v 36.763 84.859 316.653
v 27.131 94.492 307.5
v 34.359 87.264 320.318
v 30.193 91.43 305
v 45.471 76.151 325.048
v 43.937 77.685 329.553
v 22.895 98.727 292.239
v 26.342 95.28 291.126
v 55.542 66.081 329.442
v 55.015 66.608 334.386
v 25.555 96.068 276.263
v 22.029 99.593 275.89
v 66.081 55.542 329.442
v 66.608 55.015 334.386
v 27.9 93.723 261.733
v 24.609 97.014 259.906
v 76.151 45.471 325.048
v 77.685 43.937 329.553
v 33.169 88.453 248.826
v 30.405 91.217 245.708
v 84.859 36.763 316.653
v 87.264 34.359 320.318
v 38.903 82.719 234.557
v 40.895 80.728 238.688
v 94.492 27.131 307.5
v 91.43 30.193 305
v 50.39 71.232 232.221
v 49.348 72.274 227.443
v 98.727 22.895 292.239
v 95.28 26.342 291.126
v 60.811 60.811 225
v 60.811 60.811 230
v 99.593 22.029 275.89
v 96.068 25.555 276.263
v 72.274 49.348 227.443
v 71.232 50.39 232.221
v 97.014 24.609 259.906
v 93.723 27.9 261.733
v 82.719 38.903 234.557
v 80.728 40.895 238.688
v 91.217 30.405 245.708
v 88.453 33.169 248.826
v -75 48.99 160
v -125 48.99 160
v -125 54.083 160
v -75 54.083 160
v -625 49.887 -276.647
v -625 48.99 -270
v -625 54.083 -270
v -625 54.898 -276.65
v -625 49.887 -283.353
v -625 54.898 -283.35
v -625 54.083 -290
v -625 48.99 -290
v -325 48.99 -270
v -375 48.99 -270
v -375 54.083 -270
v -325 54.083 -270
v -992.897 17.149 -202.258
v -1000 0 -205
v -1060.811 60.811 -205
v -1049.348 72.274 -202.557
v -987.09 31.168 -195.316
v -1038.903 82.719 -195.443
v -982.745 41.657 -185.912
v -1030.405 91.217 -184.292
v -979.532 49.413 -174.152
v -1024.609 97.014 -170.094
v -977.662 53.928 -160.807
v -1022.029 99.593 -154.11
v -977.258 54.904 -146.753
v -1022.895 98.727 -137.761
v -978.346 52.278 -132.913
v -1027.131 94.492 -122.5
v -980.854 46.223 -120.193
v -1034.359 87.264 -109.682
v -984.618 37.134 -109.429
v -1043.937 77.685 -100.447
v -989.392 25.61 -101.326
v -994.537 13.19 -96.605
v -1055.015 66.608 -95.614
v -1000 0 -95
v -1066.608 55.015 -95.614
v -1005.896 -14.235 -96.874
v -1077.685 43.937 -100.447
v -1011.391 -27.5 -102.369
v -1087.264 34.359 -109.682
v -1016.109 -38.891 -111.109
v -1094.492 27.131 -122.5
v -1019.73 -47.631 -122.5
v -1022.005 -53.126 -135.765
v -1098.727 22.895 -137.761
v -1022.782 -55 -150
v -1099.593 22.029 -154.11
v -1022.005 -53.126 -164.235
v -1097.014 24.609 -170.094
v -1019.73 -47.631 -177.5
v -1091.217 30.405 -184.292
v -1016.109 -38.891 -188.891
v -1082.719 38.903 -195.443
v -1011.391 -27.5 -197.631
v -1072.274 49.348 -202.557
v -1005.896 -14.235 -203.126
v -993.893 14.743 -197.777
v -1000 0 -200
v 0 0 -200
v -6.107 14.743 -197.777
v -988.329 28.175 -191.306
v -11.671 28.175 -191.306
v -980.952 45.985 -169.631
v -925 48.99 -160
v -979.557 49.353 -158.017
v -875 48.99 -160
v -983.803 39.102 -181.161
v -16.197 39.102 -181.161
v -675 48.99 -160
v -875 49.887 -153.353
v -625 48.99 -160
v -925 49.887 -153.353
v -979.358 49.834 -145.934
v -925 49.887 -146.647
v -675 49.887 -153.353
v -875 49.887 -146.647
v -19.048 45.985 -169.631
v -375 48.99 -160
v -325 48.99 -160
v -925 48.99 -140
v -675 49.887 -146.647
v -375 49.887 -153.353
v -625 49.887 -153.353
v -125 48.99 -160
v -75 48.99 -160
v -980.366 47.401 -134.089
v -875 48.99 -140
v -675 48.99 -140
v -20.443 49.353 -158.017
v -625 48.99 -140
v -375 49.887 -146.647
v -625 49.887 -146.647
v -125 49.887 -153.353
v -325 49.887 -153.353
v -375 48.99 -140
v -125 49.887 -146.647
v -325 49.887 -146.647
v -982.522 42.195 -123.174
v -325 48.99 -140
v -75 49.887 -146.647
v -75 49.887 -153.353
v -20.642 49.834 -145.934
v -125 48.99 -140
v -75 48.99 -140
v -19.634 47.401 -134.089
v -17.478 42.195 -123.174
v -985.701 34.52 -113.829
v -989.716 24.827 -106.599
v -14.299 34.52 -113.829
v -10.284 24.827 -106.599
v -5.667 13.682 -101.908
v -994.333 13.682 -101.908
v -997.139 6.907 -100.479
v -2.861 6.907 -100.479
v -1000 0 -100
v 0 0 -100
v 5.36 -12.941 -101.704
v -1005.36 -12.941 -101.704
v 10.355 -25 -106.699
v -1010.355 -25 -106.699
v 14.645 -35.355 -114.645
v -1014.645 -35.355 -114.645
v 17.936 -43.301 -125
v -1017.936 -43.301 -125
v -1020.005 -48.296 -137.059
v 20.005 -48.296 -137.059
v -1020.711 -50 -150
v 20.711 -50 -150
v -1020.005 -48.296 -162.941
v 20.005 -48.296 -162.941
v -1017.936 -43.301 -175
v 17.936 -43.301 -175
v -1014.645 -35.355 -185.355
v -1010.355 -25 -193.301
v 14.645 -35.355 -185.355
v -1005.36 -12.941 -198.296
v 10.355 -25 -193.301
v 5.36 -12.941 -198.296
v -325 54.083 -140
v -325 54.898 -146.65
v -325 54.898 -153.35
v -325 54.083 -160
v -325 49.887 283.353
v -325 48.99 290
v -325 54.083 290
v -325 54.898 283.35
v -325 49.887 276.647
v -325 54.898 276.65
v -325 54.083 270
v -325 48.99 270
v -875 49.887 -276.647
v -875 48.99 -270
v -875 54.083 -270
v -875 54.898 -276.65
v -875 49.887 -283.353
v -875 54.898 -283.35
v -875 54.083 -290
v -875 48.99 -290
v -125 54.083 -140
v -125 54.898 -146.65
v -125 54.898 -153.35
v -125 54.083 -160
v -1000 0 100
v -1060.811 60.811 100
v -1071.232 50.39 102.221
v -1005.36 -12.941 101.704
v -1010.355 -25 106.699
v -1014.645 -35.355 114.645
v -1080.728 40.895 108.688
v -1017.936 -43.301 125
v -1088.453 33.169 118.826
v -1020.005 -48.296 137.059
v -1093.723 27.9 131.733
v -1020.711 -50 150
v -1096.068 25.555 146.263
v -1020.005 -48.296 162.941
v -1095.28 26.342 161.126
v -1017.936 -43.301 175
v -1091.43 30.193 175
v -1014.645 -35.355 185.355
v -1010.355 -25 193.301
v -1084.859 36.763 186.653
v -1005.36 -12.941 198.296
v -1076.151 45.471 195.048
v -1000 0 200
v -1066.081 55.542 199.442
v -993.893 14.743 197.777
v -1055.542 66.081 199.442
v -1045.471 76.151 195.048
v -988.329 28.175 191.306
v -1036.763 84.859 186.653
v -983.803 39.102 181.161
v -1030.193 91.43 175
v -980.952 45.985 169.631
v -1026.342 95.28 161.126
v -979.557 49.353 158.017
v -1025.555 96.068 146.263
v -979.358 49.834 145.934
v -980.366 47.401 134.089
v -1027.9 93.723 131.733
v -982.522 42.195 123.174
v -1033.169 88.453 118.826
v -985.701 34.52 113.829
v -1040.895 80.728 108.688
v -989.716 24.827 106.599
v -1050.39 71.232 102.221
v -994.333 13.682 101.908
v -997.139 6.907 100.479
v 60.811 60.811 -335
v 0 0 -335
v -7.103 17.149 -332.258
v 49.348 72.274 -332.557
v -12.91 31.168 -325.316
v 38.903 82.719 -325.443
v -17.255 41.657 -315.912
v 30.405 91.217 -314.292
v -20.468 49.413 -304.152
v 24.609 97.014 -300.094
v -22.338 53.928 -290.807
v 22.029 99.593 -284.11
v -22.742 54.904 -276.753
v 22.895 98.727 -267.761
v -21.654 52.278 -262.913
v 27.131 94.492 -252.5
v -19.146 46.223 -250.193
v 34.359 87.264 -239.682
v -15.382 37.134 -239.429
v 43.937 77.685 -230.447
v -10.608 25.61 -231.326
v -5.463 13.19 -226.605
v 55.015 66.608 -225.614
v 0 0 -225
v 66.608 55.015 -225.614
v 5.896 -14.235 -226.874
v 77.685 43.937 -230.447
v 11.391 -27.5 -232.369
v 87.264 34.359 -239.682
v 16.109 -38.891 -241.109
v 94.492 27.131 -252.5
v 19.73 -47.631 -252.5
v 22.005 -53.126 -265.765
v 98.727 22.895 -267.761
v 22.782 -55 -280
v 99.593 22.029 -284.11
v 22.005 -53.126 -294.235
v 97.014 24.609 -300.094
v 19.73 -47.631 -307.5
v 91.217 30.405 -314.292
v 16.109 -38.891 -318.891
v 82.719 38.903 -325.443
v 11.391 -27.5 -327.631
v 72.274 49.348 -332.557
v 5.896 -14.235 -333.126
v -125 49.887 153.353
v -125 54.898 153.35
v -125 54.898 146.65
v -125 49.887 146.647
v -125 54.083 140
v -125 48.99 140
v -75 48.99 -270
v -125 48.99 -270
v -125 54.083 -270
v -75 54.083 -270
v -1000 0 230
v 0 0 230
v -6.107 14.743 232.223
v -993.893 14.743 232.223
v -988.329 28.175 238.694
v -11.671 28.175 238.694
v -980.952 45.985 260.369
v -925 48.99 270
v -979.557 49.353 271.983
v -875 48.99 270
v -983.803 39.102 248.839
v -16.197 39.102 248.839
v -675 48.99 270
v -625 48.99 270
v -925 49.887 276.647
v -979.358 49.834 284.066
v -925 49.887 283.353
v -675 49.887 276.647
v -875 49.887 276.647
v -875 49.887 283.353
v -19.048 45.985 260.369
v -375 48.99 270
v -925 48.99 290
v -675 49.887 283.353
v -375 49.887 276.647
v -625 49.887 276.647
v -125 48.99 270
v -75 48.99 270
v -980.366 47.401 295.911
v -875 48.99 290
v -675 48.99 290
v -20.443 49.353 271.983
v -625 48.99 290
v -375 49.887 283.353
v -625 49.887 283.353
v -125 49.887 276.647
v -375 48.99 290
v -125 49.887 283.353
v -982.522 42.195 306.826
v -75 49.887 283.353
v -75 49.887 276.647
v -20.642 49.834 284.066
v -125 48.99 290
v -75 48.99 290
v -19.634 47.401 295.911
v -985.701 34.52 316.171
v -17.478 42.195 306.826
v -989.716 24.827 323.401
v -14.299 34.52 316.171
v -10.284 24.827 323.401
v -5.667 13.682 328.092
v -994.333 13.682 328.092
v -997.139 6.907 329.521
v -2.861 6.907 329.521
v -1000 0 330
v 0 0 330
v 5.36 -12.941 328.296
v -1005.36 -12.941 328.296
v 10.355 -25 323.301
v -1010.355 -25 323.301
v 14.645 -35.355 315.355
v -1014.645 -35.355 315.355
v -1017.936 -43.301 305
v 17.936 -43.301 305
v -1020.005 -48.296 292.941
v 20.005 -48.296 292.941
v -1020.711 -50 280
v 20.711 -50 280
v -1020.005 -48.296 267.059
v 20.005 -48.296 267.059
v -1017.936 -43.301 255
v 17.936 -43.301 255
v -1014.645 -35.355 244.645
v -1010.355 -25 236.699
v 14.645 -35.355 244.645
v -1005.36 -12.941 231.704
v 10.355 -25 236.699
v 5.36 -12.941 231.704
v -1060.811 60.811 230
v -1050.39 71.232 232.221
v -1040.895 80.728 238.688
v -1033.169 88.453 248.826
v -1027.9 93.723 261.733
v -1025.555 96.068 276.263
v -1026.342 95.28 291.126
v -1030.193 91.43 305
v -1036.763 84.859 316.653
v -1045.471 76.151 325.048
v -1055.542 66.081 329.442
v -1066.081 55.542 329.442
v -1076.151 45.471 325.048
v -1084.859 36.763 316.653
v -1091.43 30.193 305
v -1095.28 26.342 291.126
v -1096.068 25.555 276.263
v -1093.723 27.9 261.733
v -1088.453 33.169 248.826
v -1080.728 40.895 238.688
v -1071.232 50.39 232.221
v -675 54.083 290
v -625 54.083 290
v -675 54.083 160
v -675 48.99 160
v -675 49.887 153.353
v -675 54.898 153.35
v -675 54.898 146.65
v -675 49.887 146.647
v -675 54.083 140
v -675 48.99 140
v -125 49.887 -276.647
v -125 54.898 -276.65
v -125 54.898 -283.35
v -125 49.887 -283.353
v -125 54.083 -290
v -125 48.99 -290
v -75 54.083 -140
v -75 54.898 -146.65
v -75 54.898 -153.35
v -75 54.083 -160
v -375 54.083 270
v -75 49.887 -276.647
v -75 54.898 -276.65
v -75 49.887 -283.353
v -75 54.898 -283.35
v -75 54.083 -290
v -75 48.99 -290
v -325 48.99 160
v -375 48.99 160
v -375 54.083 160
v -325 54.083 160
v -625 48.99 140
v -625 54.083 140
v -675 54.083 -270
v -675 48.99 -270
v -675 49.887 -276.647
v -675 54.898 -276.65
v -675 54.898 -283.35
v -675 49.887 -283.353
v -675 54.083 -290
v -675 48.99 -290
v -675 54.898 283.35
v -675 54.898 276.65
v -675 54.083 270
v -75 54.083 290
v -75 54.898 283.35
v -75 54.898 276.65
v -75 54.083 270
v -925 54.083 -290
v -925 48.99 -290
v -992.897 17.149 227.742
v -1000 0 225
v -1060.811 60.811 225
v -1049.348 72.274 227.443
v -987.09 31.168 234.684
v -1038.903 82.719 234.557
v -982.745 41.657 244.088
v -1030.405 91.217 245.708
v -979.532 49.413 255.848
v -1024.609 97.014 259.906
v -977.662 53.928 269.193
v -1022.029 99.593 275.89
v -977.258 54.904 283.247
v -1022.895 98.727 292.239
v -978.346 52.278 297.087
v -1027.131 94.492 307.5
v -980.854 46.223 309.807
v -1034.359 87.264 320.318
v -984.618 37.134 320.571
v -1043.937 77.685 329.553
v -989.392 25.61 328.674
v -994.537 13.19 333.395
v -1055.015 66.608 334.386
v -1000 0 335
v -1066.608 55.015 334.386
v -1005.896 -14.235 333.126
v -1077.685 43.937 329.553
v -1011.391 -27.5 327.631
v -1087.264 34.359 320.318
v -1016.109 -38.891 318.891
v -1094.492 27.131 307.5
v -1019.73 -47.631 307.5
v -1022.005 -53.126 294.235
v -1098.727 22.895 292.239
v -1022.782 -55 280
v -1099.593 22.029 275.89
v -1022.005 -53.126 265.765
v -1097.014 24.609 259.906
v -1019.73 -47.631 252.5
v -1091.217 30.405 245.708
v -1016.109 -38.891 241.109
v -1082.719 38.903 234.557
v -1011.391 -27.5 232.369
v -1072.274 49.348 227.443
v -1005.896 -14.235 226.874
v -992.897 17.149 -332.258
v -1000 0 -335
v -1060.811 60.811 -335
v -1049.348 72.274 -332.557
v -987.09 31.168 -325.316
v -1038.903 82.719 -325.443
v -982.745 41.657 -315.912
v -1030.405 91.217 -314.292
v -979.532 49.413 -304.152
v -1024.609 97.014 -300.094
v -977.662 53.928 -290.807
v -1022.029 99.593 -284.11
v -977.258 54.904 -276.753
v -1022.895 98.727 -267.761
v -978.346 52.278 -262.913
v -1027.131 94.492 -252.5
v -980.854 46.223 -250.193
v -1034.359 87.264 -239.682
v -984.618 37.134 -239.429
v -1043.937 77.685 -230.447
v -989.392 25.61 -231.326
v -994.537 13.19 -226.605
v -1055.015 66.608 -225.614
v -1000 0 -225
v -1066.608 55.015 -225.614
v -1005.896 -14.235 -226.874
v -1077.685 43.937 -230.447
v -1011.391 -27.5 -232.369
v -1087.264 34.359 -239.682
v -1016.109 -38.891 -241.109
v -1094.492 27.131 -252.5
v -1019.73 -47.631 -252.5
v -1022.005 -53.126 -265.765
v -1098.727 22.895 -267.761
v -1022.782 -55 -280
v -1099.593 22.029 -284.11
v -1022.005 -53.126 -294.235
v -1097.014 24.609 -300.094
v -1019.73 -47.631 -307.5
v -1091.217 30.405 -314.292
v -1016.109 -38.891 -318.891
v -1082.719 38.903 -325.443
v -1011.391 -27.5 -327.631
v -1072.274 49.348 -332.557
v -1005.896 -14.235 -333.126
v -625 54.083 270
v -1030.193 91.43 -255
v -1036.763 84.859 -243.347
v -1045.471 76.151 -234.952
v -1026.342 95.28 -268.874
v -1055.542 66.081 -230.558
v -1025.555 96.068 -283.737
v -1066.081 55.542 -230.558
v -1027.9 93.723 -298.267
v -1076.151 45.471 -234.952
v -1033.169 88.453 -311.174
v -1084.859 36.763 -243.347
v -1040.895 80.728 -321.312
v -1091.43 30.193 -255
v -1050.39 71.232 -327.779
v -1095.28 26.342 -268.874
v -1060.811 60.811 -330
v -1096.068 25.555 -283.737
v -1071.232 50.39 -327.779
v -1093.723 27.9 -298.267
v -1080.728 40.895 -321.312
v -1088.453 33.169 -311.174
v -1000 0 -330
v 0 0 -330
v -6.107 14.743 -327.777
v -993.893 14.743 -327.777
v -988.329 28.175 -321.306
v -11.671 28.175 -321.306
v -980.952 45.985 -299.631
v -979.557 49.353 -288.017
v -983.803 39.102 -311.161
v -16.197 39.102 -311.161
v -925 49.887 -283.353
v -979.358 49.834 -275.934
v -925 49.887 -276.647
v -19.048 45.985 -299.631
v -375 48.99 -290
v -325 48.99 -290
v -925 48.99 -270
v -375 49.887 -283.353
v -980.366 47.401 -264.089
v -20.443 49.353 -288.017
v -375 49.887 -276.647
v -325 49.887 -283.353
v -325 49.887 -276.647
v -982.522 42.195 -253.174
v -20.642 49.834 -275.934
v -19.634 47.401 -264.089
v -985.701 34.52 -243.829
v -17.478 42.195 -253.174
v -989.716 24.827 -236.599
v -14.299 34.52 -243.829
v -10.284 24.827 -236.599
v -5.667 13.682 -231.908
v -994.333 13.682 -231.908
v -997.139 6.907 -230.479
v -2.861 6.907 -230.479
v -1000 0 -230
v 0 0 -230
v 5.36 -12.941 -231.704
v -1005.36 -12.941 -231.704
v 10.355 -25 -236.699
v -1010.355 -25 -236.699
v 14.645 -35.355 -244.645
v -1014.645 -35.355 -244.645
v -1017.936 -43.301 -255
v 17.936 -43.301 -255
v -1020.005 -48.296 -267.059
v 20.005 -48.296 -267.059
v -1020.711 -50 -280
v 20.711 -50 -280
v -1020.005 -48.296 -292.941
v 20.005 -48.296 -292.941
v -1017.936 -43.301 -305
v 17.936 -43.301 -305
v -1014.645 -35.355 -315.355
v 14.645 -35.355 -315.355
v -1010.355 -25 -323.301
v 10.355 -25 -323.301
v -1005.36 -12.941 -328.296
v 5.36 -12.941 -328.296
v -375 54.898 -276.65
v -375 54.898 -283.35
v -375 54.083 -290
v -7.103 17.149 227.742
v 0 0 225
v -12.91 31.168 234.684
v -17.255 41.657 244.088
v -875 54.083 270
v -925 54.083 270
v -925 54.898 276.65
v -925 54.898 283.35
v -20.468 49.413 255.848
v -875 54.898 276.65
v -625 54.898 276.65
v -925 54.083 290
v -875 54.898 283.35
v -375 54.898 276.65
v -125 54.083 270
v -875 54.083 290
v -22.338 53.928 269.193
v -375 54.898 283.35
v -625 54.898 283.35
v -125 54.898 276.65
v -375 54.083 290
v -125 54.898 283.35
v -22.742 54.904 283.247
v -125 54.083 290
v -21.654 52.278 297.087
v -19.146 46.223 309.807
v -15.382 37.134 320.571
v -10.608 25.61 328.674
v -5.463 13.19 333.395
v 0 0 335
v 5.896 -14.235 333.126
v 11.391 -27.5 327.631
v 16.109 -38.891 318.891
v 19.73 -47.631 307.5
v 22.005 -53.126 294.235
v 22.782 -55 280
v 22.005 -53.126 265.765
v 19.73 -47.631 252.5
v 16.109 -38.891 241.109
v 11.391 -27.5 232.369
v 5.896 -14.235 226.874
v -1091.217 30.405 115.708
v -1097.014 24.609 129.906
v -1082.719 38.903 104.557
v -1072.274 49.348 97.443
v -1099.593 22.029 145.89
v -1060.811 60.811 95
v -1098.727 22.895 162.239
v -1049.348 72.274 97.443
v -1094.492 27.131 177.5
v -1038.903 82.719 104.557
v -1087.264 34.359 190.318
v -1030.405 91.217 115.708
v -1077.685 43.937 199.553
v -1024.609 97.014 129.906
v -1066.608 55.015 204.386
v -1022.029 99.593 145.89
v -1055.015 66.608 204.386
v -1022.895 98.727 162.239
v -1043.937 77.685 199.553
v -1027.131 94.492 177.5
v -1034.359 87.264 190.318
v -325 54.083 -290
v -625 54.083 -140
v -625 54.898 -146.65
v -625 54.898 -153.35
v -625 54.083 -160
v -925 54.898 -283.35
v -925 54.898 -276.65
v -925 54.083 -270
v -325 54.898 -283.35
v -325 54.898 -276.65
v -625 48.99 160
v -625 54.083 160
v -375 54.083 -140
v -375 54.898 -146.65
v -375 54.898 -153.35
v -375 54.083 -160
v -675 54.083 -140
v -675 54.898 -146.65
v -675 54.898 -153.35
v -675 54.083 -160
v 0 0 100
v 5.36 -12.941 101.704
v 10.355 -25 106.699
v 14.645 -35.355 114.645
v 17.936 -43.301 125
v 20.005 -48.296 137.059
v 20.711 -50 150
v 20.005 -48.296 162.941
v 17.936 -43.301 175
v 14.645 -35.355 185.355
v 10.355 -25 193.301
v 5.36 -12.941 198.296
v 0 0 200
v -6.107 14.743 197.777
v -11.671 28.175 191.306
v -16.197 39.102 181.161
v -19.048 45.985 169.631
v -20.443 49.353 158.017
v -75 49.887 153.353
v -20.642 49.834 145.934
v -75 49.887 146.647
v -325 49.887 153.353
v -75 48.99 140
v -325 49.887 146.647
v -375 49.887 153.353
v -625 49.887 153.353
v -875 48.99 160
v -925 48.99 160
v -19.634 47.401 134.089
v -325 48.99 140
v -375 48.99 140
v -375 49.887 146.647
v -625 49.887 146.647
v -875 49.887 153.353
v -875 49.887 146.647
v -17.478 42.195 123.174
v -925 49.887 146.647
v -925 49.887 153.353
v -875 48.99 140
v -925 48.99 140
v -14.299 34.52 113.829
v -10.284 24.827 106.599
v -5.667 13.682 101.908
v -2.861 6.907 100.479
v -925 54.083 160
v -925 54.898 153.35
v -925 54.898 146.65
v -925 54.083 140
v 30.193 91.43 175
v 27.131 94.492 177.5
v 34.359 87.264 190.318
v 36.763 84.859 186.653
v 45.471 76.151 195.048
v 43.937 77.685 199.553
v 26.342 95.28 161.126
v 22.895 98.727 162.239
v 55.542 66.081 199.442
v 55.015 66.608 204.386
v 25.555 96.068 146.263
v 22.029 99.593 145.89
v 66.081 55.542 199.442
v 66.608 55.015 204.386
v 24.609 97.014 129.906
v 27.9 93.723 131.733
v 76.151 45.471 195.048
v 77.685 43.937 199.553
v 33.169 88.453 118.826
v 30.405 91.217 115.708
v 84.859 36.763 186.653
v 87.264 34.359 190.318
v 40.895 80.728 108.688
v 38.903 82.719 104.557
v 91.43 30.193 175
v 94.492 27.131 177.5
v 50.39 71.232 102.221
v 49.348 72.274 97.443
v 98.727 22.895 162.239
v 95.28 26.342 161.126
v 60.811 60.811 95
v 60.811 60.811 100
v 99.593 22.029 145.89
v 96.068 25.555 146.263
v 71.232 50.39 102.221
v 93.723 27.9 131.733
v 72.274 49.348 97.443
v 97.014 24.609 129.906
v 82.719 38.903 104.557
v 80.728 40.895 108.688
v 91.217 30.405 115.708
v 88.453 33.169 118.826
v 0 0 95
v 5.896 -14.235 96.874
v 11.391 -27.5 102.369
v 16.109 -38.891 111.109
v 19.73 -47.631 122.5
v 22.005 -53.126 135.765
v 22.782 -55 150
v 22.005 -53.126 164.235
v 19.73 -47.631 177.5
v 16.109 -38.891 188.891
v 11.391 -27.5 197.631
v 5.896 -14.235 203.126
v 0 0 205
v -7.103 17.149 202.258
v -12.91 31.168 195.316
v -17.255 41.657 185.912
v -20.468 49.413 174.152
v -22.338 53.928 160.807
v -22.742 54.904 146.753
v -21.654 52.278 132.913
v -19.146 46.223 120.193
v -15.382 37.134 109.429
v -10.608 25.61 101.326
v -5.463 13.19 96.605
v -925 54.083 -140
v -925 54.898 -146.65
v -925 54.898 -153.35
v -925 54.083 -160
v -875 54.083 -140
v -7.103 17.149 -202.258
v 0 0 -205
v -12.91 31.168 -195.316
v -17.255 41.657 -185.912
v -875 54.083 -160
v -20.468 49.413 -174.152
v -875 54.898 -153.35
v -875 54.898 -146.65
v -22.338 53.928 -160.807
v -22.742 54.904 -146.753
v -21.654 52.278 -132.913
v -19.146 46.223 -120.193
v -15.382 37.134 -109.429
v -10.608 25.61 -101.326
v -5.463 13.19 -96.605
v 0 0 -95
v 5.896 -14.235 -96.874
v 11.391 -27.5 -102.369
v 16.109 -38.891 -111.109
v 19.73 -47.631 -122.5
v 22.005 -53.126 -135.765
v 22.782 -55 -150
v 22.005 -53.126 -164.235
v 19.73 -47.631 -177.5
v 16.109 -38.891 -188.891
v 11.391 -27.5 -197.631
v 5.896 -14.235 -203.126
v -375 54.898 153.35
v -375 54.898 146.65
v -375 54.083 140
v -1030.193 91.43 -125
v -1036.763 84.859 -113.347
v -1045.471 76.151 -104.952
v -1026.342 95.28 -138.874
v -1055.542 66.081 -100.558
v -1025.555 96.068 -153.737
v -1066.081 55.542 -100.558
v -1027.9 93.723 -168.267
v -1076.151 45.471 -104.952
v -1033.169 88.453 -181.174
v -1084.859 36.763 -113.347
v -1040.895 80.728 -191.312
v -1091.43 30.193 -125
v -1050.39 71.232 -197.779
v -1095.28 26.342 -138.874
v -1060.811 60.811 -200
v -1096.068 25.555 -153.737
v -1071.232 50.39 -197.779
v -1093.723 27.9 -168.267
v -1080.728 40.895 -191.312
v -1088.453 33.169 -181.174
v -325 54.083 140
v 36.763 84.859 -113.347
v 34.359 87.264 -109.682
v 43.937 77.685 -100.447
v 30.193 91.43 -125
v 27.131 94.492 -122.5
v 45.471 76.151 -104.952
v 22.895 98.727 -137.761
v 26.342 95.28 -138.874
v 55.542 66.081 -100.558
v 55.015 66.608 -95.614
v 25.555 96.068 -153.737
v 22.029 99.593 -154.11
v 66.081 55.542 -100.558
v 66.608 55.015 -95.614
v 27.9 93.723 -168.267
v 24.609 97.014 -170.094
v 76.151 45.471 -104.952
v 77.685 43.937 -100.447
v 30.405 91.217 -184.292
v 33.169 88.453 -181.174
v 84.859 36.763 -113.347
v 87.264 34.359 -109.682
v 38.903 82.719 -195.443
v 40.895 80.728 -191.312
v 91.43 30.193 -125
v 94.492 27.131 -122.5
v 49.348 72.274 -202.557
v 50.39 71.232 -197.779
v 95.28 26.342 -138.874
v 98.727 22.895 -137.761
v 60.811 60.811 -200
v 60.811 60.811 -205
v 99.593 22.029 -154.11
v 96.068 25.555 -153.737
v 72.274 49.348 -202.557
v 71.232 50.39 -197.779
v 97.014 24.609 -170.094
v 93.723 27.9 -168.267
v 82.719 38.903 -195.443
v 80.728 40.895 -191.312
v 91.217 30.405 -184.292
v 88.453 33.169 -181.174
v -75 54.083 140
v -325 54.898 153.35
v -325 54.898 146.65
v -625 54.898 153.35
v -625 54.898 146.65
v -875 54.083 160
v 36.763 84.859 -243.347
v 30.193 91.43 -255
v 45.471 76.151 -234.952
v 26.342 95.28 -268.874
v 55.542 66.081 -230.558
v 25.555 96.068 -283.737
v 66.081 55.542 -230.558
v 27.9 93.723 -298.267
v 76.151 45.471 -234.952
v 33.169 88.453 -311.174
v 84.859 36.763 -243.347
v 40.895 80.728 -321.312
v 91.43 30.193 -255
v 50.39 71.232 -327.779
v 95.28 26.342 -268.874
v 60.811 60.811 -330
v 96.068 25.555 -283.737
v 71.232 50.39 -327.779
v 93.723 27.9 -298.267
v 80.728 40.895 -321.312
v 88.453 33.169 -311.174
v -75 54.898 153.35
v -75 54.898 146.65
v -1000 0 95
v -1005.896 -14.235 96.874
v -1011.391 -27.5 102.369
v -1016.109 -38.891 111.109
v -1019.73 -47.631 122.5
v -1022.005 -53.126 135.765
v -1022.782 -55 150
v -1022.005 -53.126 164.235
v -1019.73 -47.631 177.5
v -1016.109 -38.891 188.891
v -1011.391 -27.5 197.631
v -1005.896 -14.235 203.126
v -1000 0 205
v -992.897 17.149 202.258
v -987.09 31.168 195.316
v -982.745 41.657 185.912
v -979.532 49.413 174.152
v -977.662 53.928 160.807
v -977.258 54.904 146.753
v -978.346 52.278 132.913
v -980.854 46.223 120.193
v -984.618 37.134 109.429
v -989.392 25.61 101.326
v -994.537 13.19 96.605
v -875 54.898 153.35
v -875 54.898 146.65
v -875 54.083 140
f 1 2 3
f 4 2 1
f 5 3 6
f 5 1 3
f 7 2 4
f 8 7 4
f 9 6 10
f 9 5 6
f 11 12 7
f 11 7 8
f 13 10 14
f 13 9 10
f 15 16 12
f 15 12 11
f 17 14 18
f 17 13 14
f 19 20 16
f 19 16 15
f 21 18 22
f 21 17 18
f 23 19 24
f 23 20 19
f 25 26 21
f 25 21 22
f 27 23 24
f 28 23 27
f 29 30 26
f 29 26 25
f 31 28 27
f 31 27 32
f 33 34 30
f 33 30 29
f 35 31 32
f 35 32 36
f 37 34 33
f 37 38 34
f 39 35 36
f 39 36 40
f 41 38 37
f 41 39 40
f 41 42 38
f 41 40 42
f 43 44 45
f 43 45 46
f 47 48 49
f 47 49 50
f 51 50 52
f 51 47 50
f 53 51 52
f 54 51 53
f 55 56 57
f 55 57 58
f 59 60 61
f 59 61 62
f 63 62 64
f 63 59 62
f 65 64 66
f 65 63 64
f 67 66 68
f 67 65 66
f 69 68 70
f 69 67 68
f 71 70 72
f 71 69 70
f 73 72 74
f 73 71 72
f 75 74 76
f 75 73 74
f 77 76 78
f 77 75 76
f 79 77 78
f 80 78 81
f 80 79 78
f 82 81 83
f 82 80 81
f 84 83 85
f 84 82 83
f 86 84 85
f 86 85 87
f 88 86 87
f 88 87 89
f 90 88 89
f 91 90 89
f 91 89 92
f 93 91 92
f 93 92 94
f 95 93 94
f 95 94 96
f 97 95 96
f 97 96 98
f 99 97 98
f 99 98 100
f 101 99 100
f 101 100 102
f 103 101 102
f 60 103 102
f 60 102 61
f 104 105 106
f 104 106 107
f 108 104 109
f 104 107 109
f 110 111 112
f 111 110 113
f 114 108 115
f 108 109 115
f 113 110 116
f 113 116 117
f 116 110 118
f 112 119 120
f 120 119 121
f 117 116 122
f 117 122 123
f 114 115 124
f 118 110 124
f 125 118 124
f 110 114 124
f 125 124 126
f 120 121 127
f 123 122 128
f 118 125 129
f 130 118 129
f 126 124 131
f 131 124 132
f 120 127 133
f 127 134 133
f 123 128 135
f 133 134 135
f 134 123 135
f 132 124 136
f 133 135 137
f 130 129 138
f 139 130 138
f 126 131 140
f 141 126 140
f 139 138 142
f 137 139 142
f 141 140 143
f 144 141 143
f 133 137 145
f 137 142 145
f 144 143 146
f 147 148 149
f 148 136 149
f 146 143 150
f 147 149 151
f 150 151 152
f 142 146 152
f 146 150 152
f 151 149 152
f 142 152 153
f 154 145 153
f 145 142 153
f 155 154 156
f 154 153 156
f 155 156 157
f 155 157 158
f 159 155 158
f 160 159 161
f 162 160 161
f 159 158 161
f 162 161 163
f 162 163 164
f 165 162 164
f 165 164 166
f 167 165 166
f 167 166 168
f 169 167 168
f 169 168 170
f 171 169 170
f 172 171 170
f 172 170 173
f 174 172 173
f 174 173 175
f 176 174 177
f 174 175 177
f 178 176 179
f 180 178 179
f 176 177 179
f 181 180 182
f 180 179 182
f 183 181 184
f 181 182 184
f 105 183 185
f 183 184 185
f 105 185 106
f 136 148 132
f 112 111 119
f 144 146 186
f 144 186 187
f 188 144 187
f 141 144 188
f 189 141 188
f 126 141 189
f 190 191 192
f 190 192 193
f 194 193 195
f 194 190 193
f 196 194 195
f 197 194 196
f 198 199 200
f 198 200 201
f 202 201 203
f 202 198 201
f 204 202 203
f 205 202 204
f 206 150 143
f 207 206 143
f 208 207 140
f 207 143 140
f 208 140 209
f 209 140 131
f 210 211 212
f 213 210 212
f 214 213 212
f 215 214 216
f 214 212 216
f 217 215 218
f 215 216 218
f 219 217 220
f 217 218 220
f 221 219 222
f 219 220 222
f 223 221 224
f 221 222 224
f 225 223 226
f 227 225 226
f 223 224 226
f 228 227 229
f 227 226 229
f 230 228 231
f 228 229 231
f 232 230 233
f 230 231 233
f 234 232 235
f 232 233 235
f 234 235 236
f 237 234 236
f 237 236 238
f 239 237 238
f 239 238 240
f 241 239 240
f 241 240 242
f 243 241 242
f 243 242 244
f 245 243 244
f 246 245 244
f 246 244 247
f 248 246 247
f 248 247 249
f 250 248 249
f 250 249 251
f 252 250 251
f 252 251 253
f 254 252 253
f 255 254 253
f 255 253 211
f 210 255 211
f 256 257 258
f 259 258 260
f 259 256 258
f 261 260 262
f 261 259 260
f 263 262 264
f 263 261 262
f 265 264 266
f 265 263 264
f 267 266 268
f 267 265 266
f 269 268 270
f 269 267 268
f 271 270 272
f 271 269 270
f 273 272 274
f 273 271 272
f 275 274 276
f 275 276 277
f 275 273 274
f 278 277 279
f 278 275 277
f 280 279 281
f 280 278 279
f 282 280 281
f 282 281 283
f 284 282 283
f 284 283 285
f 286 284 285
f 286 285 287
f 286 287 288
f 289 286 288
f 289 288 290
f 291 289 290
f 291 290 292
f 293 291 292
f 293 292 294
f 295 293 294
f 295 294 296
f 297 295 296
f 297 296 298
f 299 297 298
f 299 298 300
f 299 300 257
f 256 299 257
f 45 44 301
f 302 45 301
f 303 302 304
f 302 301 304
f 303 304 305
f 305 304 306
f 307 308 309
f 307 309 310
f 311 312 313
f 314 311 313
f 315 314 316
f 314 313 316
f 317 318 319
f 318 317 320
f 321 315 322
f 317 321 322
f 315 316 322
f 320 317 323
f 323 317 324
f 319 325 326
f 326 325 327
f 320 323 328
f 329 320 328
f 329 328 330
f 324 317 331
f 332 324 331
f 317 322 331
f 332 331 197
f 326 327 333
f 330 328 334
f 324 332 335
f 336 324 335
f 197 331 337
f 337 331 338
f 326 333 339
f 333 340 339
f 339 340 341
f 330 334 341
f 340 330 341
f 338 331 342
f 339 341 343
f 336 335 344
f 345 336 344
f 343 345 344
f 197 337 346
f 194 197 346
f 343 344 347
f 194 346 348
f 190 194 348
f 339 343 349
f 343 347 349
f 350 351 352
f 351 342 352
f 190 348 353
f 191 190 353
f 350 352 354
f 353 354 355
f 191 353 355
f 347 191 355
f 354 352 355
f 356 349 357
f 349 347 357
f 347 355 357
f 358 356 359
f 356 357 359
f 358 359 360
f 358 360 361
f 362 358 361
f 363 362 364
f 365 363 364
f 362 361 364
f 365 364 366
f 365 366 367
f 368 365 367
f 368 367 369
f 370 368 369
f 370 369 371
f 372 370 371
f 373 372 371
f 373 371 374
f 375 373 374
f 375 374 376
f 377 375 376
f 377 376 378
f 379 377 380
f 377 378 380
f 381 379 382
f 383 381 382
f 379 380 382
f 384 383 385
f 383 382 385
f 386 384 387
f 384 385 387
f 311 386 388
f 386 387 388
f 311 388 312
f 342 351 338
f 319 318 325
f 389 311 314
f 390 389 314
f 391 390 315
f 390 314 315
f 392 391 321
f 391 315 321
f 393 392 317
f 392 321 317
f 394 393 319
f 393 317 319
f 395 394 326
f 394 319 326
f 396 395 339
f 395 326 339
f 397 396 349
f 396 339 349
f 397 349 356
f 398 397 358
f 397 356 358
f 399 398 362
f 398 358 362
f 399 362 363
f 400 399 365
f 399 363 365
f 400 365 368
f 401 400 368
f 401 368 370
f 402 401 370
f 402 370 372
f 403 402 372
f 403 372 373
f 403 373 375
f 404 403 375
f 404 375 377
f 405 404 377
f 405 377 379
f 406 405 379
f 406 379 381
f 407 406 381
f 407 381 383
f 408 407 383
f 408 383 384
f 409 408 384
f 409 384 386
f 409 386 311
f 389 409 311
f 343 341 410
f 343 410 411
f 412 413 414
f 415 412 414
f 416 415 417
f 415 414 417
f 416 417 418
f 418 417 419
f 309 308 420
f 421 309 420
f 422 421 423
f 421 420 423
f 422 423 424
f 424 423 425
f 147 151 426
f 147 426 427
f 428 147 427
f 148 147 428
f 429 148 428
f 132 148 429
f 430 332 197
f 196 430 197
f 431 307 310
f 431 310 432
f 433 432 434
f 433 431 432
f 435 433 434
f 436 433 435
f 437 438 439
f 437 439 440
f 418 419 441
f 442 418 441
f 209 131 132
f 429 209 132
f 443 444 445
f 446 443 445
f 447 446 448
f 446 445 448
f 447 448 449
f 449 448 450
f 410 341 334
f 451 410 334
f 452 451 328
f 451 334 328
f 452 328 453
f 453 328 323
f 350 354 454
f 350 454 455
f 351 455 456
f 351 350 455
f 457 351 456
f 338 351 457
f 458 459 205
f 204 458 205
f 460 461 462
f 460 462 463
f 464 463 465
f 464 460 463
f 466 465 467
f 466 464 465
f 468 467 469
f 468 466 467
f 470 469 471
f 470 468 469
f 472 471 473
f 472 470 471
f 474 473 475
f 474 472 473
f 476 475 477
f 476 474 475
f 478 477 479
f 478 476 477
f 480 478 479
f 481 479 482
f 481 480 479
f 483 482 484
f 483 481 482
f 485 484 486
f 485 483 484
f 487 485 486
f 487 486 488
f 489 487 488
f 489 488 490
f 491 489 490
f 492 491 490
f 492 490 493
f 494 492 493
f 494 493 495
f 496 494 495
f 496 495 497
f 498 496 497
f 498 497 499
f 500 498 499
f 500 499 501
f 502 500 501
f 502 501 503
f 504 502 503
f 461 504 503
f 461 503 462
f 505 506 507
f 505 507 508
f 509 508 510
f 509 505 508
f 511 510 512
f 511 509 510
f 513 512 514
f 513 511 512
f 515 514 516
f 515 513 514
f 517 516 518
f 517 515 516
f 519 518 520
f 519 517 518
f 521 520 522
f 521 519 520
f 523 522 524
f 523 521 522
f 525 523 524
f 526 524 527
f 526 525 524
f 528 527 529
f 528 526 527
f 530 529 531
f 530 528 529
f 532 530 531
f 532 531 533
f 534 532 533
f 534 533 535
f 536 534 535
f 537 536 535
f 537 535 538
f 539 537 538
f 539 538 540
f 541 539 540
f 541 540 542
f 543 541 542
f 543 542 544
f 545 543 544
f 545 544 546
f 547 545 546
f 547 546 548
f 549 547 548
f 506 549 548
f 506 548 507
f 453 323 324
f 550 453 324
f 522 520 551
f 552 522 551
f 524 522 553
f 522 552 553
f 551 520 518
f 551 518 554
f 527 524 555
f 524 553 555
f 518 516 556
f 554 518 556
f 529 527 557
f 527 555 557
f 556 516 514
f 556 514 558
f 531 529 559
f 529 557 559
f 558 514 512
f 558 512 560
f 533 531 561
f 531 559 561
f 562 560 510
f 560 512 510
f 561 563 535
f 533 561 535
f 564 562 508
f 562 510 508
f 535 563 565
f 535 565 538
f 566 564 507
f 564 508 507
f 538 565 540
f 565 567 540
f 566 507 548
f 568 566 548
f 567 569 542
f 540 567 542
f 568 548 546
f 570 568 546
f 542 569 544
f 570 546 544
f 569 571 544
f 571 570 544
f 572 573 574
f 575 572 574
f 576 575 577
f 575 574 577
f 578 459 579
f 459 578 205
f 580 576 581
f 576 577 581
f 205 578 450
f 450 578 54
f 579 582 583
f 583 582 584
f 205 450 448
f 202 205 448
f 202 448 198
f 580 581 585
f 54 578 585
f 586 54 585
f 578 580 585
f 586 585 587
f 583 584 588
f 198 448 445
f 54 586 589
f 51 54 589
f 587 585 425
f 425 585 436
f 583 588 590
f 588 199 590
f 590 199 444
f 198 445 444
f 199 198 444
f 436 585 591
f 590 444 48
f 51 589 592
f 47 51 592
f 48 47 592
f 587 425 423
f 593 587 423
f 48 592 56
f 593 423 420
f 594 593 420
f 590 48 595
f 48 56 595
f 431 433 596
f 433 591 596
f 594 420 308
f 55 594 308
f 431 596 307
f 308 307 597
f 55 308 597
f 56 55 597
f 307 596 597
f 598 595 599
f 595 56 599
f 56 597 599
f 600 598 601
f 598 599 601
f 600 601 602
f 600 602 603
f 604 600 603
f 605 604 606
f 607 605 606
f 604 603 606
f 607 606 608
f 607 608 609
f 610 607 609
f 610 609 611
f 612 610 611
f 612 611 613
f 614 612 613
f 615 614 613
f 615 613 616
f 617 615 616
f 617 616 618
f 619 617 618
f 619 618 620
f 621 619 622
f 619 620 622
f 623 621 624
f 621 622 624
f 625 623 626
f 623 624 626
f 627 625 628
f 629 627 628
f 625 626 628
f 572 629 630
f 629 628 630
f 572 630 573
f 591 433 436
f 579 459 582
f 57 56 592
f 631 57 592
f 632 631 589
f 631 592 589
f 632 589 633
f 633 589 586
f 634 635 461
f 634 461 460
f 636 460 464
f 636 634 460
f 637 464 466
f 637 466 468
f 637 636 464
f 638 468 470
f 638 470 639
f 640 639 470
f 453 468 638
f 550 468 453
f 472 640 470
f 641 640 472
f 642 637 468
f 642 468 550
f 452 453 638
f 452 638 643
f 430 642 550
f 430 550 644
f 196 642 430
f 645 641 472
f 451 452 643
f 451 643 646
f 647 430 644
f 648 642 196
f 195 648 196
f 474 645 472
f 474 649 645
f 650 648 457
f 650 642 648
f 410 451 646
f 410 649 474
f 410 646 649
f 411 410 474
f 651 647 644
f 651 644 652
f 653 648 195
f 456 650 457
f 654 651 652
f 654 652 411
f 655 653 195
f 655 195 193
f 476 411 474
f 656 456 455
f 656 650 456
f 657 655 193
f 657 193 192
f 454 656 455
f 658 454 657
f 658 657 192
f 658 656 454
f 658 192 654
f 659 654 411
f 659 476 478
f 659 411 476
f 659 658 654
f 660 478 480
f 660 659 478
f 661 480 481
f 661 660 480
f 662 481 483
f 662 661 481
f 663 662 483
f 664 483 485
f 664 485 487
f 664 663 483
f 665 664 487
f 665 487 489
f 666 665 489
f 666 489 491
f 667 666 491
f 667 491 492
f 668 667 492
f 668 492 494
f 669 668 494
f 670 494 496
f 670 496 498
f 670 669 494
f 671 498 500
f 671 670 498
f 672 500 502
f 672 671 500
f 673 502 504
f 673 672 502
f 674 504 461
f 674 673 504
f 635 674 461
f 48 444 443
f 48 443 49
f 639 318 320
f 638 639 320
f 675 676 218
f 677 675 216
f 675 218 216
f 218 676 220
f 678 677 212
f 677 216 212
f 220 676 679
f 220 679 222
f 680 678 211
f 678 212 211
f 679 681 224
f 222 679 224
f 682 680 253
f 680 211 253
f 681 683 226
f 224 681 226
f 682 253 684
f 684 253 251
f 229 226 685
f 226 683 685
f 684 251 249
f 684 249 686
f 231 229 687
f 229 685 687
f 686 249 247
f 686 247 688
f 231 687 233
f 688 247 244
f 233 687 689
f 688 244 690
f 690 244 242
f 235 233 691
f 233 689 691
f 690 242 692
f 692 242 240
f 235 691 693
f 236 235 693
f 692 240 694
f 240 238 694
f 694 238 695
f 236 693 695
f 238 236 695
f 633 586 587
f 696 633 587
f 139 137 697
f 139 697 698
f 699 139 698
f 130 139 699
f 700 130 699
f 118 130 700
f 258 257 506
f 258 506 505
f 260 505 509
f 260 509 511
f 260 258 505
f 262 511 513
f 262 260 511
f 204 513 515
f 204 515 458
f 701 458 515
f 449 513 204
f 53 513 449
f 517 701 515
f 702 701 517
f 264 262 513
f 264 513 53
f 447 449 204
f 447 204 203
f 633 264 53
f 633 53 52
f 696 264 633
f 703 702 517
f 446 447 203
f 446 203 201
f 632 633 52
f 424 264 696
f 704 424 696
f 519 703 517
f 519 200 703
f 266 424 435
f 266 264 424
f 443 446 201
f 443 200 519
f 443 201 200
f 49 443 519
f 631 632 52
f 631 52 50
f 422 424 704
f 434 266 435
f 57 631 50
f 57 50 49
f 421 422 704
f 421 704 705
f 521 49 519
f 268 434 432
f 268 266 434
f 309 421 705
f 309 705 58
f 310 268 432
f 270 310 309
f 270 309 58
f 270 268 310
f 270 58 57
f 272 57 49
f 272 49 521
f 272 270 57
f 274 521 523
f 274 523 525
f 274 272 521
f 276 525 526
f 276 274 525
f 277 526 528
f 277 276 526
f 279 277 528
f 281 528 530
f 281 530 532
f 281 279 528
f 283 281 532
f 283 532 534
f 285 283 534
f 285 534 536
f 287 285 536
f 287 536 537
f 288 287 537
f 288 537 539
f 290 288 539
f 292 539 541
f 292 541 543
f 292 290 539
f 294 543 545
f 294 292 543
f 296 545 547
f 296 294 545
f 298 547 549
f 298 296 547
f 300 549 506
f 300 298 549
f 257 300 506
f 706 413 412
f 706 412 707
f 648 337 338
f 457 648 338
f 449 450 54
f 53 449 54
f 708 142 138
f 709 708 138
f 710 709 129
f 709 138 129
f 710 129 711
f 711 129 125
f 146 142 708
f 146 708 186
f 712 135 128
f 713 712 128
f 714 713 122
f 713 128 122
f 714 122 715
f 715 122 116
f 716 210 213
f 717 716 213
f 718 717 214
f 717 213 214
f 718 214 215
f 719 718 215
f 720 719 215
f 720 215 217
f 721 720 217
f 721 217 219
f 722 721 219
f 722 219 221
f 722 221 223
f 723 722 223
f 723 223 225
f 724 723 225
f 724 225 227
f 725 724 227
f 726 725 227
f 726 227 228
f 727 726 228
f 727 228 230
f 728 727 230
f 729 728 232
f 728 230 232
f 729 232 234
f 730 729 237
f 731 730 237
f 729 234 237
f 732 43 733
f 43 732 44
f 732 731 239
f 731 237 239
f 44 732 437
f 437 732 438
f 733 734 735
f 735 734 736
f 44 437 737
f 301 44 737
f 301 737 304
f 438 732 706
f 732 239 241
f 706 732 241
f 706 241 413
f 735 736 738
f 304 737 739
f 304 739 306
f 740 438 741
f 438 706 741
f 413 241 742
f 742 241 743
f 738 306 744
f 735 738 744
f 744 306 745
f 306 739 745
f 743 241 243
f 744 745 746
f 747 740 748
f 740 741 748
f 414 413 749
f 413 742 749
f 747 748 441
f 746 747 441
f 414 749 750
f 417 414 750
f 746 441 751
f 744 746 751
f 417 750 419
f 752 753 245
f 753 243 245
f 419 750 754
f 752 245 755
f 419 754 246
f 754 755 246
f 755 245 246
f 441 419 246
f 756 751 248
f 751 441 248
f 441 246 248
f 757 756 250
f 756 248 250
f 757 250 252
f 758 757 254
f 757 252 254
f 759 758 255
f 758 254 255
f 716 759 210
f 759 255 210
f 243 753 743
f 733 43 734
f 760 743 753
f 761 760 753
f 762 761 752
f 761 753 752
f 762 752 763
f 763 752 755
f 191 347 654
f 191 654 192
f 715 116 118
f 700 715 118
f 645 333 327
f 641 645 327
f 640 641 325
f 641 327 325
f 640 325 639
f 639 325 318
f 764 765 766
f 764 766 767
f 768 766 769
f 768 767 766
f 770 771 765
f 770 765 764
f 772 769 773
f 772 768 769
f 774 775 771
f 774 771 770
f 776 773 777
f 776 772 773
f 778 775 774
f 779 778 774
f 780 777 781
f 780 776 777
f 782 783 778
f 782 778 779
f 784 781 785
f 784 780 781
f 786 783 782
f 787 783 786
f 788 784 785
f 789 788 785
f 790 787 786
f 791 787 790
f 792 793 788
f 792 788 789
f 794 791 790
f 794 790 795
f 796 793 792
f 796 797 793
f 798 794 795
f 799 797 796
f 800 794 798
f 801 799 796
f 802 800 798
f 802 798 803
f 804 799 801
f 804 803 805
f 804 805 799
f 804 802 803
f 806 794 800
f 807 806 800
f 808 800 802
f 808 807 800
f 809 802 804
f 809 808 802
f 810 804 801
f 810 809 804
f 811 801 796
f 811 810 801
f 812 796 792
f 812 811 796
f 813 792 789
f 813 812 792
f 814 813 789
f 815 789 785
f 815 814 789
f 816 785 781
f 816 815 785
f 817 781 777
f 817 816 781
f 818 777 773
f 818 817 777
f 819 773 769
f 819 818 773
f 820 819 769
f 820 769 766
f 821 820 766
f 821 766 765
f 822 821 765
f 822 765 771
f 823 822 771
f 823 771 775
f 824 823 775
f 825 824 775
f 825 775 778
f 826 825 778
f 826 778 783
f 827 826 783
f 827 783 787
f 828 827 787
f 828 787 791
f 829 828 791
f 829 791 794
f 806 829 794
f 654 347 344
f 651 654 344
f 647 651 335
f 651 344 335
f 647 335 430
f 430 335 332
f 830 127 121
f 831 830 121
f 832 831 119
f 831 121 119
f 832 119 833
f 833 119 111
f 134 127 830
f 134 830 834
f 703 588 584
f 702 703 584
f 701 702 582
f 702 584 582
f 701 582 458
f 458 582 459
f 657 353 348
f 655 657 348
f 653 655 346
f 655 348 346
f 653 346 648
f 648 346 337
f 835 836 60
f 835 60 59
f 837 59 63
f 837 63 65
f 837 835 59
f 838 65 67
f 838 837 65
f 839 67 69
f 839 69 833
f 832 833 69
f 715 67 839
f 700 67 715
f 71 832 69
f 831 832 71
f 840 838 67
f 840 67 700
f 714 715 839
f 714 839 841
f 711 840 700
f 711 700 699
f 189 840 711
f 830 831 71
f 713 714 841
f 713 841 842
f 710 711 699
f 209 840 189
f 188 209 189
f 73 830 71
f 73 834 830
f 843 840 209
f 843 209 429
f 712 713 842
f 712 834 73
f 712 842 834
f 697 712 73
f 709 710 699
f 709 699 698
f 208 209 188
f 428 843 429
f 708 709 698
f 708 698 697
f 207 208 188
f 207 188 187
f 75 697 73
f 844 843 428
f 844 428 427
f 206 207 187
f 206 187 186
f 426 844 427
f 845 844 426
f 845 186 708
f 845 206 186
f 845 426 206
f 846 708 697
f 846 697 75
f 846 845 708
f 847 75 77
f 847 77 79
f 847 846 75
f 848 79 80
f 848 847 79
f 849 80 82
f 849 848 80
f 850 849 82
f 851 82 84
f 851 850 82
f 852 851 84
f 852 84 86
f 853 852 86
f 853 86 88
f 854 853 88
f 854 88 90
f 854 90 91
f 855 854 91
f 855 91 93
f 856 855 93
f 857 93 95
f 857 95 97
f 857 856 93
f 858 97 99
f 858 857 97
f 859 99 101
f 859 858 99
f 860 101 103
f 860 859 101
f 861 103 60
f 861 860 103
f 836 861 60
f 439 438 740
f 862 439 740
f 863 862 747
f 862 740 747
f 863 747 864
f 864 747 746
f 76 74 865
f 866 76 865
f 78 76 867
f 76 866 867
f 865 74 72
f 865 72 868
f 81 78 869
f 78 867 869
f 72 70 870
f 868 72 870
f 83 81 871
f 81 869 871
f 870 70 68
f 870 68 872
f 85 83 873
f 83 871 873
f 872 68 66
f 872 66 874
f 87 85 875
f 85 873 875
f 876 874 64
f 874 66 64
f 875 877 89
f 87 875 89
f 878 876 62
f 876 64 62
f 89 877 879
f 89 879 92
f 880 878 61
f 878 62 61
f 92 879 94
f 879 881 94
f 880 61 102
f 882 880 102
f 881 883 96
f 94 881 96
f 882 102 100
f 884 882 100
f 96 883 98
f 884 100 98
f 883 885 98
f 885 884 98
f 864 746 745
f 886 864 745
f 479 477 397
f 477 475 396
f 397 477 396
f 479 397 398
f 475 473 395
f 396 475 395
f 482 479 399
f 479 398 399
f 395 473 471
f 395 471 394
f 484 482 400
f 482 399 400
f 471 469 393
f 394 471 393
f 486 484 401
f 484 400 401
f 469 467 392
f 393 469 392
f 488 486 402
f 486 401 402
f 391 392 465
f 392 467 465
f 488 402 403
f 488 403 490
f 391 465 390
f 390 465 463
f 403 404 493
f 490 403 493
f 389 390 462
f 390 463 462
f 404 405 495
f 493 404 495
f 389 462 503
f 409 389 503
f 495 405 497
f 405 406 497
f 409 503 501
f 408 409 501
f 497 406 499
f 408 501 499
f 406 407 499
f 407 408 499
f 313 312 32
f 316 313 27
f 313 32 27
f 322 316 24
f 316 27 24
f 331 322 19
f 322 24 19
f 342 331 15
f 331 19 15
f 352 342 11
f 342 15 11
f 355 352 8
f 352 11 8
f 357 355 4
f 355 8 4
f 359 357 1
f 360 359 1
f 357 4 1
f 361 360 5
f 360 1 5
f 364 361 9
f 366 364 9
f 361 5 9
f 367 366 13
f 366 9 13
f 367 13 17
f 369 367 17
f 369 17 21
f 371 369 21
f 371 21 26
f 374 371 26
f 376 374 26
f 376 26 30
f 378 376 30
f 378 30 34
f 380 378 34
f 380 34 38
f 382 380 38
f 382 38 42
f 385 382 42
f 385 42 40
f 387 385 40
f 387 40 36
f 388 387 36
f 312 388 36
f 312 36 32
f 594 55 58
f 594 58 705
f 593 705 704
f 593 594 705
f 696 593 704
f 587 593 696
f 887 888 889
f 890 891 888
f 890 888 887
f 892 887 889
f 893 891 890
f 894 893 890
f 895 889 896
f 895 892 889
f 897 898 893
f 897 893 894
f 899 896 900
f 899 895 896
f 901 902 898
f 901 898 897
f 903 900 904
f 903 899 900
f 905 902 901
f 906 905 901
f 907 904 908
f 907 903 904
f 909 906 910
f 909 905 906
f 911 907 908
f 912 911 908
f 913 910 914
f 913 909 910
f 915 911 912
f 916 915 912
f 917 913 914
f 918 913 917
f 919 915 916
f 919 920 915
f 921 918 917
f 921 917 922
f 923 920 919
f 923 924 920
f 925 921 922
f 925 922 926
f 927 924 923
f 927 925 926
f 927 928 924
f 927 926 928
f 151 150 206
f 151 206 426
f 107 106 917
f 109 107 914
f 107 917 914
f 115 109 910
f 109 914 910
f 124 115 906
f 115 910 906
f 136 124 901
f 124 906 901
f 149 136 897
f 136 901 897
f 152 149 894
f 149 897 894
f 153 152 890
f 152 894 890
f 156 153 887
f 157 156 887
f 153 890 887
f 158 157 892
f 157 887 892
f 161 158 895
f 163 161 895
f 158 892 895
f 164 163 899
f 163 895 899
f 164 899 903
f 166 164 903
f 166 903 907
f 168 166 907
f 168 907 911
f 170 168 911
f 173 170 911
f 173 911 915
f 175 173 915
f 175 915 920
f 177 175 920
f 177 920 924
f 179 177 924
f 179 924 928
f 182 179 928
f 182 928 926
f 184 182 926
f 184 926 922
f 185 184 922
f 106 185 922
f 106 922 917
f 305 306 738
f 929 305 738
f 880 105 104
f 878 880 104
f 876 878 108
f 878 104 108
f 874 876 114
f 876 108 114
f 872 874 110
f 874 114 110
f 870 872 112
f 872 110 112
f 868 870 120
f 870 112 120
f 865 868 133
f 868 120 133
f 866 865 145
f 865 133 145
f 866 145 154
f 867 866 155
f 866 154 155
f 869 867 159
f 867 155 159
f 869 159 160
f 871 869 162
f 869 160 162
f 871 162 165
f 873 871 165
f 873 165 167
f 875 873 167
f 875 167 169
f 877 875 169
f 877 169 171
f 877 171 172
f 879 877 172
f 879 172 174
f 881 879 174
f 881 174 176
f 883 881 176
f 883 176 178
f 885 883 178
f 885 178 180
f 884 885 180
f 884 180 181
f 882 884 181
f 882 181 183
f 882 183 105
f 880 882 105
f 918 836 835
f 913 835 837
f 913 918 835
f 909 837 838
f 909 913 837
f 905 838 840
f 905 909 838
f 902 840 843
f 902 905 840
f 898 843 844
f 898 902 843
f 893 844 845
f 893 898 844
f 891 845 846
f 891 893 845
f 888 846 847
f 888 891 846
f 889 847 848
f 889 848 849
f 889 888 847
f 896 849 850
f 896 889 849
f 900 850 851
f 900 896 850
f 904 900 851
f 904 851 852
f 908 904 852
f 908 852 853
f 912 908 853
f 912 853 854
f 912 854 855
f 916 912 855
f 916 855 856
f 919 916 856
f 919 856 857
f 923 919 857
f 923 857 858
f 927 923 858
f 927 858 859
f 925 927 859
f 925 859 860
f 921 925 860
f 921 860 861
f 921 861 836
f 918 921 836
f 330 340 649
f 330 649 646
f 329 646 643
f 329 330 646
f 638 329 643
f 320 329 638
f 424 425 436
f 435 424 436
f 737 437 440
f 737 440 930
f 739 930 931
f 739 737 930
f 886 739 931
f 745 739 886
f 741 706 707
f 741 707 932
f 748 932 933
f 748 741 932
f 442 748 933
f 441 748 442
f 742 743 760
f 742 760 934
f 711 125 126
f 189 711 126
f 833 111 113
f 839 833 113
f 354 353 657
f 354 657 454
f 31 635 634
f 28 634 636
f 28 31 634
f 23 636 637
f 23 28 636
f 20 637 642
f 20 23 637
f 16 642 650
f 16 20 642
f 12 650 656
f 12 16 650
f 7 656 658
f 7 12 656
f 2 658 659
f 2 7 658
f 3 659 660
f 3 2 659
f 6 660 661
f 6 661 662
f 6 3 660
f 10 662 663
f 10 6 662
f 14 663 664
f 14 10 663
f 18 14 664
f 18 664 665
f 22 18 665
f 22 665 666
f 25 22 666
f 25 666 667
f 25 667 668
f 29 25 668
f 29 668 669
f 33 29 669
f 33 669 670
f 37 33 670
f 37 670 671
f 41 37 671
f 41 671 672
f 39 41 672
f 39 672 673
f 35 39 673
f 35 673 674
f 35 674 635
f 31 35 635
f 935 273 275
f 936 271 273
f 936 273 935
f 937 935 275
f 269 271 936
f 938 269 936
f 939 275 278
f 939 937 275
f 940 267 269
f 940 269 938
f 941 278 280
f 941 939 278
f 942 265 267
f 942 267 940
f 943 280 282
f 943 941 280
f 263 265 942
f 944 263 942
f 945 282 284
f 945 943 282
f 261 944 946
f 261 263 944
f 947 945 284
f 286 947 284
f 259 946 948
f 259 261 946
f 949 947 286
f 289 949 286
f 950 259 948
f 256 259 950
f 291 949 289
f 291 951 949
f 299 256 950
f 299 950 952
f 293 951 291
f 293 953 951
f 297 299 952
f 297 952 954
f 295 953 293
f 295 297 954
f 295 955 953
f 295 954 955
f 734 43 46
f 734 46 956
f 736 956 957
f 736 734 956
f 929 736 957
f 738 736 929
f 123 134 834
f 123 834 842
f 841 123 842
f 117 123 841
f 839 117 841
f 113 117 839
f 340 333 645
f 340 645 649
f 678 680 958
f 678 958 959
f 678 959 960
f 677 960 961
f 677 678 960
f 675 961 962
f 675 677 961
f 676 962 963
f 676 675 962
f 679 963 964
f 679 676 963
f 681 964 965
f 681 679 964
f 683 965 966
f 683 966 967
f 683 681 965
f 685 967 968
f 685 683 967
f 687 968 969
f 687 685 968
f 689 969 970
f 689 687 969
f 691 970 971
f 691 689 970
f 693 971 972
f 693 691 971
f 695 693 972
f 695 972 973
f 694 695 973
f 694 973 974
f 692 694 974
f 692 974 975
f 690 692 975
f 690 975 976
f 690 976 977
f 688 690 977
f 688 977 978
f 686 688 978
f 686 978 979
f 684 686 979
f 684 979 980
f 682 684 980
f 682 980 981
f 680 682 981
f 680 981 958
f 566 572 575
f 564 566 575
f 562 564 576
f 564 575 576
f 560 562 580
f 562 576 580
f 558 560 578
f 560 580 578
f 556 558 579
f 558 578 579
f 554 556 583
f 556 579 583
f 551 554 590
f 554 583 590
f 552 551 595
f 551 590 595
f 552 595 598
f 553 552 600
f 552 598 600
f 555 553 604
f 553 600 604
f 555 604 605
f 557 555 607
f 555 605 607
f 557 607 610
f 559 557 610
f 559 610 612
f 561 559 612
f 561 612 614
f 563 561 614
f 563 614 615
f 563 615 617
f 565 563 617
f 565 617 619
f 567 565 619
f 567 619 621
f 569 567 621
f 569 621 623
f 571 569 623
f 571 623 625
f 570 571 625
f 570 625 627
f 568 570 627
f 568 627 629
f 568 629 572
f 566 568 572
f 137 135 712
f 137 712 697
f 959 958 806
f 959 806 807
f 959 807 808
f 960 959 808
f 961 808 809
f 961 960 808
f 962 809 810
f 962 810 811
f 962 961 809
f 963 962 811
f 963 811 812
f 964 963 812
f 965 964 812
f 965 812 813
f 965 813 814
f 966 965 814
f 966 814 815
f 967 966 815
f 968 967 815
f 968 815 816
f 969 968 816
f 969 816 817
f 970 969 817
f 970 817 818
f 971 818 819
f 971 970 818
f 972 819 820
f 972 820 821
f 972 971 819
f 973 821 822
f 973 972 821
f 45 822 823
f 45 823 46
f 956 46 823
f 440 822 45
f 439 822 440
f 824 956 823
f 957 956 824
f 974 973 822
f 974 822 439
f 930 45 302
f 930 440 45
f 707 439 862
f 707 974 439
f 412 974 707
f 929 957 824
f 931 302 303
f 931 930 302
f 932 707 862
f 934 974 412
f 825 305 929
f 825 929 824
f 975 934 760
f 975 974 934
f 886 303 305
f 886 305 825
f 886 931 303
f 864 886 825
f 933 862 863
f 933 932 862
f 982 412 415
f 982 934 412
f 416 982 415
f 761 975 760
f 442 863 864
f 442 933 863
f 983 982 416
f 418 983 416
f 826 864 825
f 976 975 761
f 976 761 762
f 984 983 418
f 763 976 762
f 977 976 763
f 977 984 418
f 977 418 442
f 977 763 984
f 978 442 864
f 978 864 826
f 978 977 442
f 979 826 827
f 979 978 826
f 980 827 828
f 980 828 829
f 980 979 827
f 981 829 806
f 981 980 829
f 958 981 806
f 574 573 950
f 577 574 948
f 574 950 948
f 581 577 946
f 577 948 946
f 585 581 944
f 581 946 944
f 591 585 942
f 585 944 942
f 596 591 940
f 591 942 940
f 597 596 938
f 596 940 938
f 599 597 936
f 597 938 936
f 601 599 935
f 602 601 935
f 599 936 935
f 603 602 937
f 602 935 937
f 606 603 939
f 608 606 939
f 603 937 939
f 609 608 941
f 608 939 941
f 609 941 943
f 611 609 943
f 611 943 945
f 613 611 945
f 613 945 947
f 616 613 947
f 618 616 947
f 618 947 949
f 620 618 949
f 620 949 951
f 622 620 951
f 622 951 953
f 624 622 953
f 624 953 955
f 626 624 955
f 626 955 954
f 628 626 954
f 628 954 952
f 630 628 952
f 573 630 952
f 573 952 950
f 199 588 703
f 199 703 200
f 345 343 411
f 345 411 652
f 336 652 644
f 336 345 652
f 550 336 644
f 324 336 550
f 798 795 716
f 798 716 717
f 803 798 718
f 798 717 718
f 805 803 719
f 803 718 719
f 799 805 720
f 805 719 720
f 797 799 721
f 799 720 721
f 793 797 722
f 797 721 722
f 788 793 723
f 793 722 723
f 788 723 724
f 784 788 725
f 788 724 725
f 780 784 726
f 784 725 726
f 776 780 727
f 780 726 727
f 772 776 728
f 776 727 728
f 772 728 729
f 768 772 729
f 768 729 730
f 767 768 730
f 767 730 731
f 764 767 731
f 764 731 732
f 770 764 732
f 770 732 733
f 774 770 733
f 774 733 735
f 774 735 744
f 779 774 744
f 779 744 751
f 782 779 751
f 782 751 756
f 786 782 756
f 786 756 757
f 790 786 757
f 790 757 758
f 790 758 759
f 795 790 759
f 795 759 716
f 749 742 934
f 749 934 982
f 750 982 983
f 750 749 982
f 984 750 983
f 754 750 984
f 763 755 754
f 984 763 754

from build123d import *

# Parameters (mm, degrees)
SKETCH_8_R          = 55
SKETCH_8_R_2        = 50
SKETCH_9_R          = 55
SKETCH_9_R_2        = 50
CUT_EXTRUDE_START   = 48.989795
SKETCH_10_W         = 50
SKETCH_10_H         = 20
CUT_EXTRUDE_2_DEPTH = 6.010205
SKETCH_12_R         = 55
SKETCH_12_R_2       = 50
SKETCH_13_W         = 50
SKETCH_13_H         = 20
CUT_EXTRUDE_4_DEPTH = 60


with BuildPart() as part:
    # По траектории2: sweep along a path in Эскиз4
    with BuildLine(Plane.XY.offset(150)) as sweep_2_path:
        Line((60.811183182, 60.811183182), (0, 0))
        Line((0, 0), (-1000, 0))
        Line((-1000, 0), (-1060.811183182, 60.811183182))
    # Эскиз8 → По траектории2 (sweep)
    with BuildSketch(Plane(origin=(0, 0, 0), x_dir=(0, 0, -1), z_dir=(1, 0, 0))):
        with Locations((-150, 0)):
            Circle(SKETCH_8_R)
        with Locations((-150, 0)):
            Circle(SKETCH_8_R_2, mode=Mode.SUBTRACT)
    sweep(path=sweep_2_path.line, transition=Transition.RIGHT)


with BuildPart() as body_2:
    # По траектории3: sweep along a path in Эскиз7
    with BuildLine(Plane.XY.offset(-150)) as sweep_3_path:
        Line((-1060.811183182, 60.811183182), (-1000, 0))
        Line((-1000, 0), (0, 0))
        Line((0, 0), (60.811183182, 60.811183182))
    # Эскиз9 → По траектории3 (sweep)
    with BuildSketch(Plane(origin=(0, 0, 0), x_dir=(0, 0, -1), z_dir=(1, 0, 0))):
        with Locations((150, 0)):
            Circle(SKETCH_9_R)
        with Locations((150, 0)):
            Circle(SKETCH_9_R_2, mode=Mode.SUBTRACT)
    sweep(path=sweep_3_path.line, transition=Transition.RIGHT)


with BuildPart() as cut_extrude_2_tool:
    # Эскиз10 → Вырез-Вытянуть2 (new body)
    with BuildSketch(Plane(origin=(0, 0, 0), x_dir=(1, 0, 0), z_dir=(0, 1, 0)).offset(CUT_EXTRUDE_START)):
        with Locations((-900, 150)):
            Rectangle(SKETCH_10_W, SKETCH_10_H)
        with Locations((-100, 150)):
            Rectangle(SKETCH_10_W, SKETCH_10_H)
        with Locations((-100, -150)):
            Rectangle(SKETCH_10_W, SKETCH_10_H)
        with Locations((-900, -150)):
            Rectangle(SKETCH_10_W, SKETCH_10_H)
        with Locations((-350, 150)):
            Rectangle(SKETCH_10_W, SKETCH_10_H)
        with Locations((-650, 150)):
            Rectangle(SKETCH_10_W, SKETCH_10_H)
        with Locations((-350, -150)):
            Rectangle(SKETCH_10_W, SKETCH_10_H)
        with Locations((-650, -150)):
            Rectangle(SKETCH_10_W, SKETCH_10_H)
    extrude(amount=CUT_EXTRUDE_2_DEPTH)


with BuildPart() as part_1:
    add(part.part)

    # Вырез-Вытянуть2: cut by cut_extrude_2_tool
    add(cut_extrude_2_tool.part, mode=Mode.SUBTRACT)


with BuildPart() as body_2_1:
    add(body_2.part)

    # Вырез-Вытянуть2: cut by cut_extrude_2_tool
    add(cut_extrude_2_tool.part, mode=Mode.SUBTRACT)


with BuildPart() as body_3:
    # По траектории4: sweep along a path in Эскиз11
    with BuildLine(Plane.XY.offset(-280)) as sweep_4_path:
        Line((-1060.811183182, 60.811183182), (-1000, 0))
        Line((-1000, 0), (0, 0))
        Line((0, 0), (60.811183182, 60.811183182))
    # Эскиз12 → По траектории4 (sweep)
    # profile 1 of 2: a face of its own
    with BuildSketch(Plane(origin=(0, 0, 0), x_dir=(0, 0, -1), z_dir=(1, 0, 0))):
        with Locations((280, 0)):
            Circle(SKETCH_12_R)
        with Locations((280, 0)):
            Circle(SKETCH_12_R_2, mode=Mode.SUBTRACT)
    # profile 2 of 2: a face of its own
    with BuildSketch(Plane(origin=(0, 0, 0), x_dir=(0, 0, -1), z_dir=(1, 0, 0))):
        with Locations((-280, 0)):
            Circle(SKETCH_12_R)
        with Locations((-280, 0)):
            Circle(SKETCH_12_R_2, mode=Mode.SUBTRACT)
    sweep(path=sweep_4_path.line, transition=Transition.RIGHT)

    # Эскиз13 → Вырез-Вытянуть4 (cut)
    with BuildSketch(Plane(origin=(0, 0, 0), x_dir=(1, 0, 0), z_dir=(0, 1, 0))):
        with Locations((-900, 280)):
            Rectangle(SKETCH_13_W, SKETCH_13_H)
        with Locations((-650, 280)):
            Rectangle(SKETCH_13_W, SKETCH_13_H)
        with Locations((-350, 280)):
            Rectangle(SKETCH_13_W, SKETCH_13_H)
        with Locations((-100, 280)):
            Rectangle(SKETCH_13_W, SKETCH_13_H)
        with Locations((-100, -280)):
            Rectangle(SKETCH_13_W, SKETCH_13_H)
        with Locations((-350, -280)):
            Rectangle(SKETCH_13_W, SKETCH_13_H)
        with Locations((-650, -280)):
            Rectangle(SKETCH_13_W, SKETCH_13_H)
        with Locations((-900, -280)):
            Rectangle(SKETCH_13_W, SKETCH_13_H)
    extrude(amount=CUT_EXTRUDE_4_DEPTH, mode=Mode.SUBTRACT)


solid = Compound([part_1.part, body_2_1.part, body_3.part])
